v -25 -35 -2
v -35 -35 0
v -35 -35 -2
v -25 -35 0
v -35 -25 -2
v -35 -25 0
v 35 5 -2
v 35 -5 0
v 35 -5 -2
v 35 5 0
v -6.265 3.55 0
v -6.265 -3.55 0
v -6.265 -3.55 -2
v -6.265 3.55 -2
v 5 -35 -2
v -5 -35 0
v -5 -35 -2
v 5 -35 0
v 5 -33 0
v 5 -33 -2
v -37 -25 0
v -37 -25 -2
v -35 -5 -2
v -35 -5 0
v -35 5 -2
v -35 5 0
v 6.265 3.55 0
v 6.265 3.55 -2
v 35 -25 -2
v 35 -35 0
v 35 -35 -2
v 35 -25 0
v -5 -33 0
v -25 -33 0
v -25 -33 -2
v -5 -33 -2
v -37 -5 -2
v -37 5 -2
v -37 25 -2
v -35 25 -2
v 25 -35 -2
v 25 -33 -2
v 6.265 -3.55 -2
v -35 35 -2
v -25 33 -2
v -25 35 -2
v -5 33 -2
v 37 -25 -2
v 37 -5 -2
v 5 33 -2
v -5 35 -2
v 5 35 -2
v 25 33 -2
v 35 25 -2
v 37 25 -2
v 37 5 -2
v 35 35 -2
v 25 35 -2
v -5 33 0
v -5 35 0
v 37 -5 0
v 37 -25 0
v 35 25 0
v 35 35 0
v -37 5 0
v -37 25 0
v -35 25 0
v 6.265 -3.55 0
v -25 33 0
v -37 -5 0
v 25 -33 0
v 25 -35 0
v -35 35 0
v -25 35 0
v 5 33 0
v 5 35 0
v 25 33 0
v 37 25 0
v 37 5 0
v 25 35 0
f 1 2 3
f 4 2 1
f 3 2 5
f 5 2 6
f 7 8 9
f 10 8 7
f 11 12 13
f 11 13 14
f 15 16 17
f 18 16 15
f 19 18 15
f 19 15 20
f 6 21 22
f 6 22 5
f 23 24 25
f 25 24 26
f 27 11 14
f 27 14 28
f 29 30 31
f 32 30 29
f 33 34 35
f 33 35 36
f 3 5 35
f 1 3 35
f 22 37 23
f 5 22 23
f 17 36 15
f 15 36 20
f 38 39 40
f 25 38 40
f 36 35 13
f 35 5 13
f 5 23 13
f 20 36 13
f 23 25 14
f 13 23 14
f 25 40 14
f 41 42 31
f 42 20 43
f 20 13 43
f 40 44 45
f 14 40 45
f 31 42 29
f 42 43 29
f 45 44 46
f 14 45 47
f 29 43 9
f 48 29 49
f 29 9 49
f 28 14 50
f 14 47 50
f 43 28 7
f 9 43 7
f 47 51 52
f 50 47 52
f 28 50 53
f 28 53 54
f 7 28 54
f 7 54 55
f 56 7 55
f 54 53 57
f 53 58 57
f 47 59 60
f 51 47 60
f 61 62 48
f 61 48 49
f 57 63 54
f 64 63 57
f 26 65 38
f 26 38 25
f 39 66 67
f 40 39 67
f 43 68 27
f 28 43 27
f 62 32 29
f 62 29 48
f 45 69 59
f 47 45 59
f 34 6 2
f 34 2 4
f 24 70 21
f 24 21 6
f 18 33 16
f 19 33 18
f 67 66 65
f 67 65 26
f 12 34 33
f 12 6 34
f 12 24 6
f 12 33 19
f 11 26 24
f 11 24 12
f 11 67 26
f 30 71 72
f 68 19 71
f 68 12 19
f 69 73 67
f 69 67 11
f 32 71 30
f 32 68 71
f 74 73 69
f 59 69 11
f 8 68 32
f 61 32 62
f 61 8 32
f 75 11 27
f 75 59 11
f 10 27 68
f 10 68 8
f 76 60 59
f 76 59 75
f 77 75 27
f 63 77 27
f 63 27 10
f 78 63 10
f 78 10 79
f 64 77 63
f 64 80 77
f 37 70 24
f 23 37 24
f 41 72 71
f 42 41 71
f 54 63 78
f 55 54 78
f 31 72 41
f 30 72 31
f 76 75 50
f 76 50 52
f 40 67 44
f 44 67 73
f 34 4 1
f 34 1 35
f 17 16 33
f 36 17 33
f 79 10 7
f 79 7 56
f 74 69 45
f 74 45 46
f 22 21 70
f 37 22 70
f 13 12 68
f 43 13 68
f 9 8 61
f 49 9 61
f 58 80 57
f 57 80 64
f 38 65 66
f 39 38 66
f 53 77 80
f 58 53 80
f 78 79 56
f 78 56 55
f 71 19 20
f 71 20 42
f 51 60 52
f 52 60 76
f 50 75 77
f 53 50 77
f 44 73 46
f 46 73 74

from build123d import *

# Parameters (mm, degrees)
SKETCH1_W           = 70
SKETCH1_H           = 70
BOSS_EXTRUDE1_DEPTH = 2
SKETCH2_W           = 2
SKETCH2_H           = 20
BOSS_EXTRUDE2_DEPTH = 2
SKETCH3_W           = 20
SKETCH3_H           = 2
CUT_EXTRUDE1_DEPTH  = 2
SKETCH4_W           = 12.53
SKETCH4_H           = 7.1
CUT_EXTRUDE2_DEPTH  = 10


with BuildPart() as part:
    # Sketch1 → Boss-Extrude1 (new body)
    with BuildSketch(Plane.XY):
        Rectangle(SKETCH1_W, SKETCH1_H)
    extrude(amount=-BOSS_EXTRUDE1_DEPTH)

    # Sketch2 → Boss-Extrude2 (add)
    with BuildSketch(Plane.XY):
        with Locations((-36, 15)):
            Rectangle(SKETCH2_W, SKETCH2_H)
        with Locations((-36, -15)):
            Rectangle(SKETCH2_W, SKETCH2_H)
        with Locations((36, -15)):
            Rectangle(SKETCH2_W, SKETCH2_H)
        with Locations((36, 15)):
            Rectangle(SKETCH2_W, SKETCH2_H)
    extrude(amount=-BOSS_EXTRUDE2_DEPTH)

    # Sketch3 → Cut-Extrude1 (cut)
    with BuildSketch(Plane.XY):
        with Locations((-15, 34)):
            Rectangle(SKETCH3_W, SKETCH3_H)
        with Locations((15, 34)):
            Rectangle(SKETCH3_W, SKETCH3_H)
        with Locations((-15, -34)):
            Rectangle(SKETCH3_W, SKETCH3_H)
        with Locations((15, -34)):
            Rectangle(SKETCH3_W, SKETCH3_H)
    extrude(amount=-CUT_EXTRUDE1_DEPTH, mode=Mode.SUBTRACT)

    # Sketch4 → Cut-Extrude2 (cut)
    with BuildSketch(Plane.XY):
        Rectangle(SKETCH4_W, SKETCH4_H)
    extrude(amount=-CUT_EXTRUDE2_DEPTH, mode=Mode.SUBTRACT)


solid = part.part
